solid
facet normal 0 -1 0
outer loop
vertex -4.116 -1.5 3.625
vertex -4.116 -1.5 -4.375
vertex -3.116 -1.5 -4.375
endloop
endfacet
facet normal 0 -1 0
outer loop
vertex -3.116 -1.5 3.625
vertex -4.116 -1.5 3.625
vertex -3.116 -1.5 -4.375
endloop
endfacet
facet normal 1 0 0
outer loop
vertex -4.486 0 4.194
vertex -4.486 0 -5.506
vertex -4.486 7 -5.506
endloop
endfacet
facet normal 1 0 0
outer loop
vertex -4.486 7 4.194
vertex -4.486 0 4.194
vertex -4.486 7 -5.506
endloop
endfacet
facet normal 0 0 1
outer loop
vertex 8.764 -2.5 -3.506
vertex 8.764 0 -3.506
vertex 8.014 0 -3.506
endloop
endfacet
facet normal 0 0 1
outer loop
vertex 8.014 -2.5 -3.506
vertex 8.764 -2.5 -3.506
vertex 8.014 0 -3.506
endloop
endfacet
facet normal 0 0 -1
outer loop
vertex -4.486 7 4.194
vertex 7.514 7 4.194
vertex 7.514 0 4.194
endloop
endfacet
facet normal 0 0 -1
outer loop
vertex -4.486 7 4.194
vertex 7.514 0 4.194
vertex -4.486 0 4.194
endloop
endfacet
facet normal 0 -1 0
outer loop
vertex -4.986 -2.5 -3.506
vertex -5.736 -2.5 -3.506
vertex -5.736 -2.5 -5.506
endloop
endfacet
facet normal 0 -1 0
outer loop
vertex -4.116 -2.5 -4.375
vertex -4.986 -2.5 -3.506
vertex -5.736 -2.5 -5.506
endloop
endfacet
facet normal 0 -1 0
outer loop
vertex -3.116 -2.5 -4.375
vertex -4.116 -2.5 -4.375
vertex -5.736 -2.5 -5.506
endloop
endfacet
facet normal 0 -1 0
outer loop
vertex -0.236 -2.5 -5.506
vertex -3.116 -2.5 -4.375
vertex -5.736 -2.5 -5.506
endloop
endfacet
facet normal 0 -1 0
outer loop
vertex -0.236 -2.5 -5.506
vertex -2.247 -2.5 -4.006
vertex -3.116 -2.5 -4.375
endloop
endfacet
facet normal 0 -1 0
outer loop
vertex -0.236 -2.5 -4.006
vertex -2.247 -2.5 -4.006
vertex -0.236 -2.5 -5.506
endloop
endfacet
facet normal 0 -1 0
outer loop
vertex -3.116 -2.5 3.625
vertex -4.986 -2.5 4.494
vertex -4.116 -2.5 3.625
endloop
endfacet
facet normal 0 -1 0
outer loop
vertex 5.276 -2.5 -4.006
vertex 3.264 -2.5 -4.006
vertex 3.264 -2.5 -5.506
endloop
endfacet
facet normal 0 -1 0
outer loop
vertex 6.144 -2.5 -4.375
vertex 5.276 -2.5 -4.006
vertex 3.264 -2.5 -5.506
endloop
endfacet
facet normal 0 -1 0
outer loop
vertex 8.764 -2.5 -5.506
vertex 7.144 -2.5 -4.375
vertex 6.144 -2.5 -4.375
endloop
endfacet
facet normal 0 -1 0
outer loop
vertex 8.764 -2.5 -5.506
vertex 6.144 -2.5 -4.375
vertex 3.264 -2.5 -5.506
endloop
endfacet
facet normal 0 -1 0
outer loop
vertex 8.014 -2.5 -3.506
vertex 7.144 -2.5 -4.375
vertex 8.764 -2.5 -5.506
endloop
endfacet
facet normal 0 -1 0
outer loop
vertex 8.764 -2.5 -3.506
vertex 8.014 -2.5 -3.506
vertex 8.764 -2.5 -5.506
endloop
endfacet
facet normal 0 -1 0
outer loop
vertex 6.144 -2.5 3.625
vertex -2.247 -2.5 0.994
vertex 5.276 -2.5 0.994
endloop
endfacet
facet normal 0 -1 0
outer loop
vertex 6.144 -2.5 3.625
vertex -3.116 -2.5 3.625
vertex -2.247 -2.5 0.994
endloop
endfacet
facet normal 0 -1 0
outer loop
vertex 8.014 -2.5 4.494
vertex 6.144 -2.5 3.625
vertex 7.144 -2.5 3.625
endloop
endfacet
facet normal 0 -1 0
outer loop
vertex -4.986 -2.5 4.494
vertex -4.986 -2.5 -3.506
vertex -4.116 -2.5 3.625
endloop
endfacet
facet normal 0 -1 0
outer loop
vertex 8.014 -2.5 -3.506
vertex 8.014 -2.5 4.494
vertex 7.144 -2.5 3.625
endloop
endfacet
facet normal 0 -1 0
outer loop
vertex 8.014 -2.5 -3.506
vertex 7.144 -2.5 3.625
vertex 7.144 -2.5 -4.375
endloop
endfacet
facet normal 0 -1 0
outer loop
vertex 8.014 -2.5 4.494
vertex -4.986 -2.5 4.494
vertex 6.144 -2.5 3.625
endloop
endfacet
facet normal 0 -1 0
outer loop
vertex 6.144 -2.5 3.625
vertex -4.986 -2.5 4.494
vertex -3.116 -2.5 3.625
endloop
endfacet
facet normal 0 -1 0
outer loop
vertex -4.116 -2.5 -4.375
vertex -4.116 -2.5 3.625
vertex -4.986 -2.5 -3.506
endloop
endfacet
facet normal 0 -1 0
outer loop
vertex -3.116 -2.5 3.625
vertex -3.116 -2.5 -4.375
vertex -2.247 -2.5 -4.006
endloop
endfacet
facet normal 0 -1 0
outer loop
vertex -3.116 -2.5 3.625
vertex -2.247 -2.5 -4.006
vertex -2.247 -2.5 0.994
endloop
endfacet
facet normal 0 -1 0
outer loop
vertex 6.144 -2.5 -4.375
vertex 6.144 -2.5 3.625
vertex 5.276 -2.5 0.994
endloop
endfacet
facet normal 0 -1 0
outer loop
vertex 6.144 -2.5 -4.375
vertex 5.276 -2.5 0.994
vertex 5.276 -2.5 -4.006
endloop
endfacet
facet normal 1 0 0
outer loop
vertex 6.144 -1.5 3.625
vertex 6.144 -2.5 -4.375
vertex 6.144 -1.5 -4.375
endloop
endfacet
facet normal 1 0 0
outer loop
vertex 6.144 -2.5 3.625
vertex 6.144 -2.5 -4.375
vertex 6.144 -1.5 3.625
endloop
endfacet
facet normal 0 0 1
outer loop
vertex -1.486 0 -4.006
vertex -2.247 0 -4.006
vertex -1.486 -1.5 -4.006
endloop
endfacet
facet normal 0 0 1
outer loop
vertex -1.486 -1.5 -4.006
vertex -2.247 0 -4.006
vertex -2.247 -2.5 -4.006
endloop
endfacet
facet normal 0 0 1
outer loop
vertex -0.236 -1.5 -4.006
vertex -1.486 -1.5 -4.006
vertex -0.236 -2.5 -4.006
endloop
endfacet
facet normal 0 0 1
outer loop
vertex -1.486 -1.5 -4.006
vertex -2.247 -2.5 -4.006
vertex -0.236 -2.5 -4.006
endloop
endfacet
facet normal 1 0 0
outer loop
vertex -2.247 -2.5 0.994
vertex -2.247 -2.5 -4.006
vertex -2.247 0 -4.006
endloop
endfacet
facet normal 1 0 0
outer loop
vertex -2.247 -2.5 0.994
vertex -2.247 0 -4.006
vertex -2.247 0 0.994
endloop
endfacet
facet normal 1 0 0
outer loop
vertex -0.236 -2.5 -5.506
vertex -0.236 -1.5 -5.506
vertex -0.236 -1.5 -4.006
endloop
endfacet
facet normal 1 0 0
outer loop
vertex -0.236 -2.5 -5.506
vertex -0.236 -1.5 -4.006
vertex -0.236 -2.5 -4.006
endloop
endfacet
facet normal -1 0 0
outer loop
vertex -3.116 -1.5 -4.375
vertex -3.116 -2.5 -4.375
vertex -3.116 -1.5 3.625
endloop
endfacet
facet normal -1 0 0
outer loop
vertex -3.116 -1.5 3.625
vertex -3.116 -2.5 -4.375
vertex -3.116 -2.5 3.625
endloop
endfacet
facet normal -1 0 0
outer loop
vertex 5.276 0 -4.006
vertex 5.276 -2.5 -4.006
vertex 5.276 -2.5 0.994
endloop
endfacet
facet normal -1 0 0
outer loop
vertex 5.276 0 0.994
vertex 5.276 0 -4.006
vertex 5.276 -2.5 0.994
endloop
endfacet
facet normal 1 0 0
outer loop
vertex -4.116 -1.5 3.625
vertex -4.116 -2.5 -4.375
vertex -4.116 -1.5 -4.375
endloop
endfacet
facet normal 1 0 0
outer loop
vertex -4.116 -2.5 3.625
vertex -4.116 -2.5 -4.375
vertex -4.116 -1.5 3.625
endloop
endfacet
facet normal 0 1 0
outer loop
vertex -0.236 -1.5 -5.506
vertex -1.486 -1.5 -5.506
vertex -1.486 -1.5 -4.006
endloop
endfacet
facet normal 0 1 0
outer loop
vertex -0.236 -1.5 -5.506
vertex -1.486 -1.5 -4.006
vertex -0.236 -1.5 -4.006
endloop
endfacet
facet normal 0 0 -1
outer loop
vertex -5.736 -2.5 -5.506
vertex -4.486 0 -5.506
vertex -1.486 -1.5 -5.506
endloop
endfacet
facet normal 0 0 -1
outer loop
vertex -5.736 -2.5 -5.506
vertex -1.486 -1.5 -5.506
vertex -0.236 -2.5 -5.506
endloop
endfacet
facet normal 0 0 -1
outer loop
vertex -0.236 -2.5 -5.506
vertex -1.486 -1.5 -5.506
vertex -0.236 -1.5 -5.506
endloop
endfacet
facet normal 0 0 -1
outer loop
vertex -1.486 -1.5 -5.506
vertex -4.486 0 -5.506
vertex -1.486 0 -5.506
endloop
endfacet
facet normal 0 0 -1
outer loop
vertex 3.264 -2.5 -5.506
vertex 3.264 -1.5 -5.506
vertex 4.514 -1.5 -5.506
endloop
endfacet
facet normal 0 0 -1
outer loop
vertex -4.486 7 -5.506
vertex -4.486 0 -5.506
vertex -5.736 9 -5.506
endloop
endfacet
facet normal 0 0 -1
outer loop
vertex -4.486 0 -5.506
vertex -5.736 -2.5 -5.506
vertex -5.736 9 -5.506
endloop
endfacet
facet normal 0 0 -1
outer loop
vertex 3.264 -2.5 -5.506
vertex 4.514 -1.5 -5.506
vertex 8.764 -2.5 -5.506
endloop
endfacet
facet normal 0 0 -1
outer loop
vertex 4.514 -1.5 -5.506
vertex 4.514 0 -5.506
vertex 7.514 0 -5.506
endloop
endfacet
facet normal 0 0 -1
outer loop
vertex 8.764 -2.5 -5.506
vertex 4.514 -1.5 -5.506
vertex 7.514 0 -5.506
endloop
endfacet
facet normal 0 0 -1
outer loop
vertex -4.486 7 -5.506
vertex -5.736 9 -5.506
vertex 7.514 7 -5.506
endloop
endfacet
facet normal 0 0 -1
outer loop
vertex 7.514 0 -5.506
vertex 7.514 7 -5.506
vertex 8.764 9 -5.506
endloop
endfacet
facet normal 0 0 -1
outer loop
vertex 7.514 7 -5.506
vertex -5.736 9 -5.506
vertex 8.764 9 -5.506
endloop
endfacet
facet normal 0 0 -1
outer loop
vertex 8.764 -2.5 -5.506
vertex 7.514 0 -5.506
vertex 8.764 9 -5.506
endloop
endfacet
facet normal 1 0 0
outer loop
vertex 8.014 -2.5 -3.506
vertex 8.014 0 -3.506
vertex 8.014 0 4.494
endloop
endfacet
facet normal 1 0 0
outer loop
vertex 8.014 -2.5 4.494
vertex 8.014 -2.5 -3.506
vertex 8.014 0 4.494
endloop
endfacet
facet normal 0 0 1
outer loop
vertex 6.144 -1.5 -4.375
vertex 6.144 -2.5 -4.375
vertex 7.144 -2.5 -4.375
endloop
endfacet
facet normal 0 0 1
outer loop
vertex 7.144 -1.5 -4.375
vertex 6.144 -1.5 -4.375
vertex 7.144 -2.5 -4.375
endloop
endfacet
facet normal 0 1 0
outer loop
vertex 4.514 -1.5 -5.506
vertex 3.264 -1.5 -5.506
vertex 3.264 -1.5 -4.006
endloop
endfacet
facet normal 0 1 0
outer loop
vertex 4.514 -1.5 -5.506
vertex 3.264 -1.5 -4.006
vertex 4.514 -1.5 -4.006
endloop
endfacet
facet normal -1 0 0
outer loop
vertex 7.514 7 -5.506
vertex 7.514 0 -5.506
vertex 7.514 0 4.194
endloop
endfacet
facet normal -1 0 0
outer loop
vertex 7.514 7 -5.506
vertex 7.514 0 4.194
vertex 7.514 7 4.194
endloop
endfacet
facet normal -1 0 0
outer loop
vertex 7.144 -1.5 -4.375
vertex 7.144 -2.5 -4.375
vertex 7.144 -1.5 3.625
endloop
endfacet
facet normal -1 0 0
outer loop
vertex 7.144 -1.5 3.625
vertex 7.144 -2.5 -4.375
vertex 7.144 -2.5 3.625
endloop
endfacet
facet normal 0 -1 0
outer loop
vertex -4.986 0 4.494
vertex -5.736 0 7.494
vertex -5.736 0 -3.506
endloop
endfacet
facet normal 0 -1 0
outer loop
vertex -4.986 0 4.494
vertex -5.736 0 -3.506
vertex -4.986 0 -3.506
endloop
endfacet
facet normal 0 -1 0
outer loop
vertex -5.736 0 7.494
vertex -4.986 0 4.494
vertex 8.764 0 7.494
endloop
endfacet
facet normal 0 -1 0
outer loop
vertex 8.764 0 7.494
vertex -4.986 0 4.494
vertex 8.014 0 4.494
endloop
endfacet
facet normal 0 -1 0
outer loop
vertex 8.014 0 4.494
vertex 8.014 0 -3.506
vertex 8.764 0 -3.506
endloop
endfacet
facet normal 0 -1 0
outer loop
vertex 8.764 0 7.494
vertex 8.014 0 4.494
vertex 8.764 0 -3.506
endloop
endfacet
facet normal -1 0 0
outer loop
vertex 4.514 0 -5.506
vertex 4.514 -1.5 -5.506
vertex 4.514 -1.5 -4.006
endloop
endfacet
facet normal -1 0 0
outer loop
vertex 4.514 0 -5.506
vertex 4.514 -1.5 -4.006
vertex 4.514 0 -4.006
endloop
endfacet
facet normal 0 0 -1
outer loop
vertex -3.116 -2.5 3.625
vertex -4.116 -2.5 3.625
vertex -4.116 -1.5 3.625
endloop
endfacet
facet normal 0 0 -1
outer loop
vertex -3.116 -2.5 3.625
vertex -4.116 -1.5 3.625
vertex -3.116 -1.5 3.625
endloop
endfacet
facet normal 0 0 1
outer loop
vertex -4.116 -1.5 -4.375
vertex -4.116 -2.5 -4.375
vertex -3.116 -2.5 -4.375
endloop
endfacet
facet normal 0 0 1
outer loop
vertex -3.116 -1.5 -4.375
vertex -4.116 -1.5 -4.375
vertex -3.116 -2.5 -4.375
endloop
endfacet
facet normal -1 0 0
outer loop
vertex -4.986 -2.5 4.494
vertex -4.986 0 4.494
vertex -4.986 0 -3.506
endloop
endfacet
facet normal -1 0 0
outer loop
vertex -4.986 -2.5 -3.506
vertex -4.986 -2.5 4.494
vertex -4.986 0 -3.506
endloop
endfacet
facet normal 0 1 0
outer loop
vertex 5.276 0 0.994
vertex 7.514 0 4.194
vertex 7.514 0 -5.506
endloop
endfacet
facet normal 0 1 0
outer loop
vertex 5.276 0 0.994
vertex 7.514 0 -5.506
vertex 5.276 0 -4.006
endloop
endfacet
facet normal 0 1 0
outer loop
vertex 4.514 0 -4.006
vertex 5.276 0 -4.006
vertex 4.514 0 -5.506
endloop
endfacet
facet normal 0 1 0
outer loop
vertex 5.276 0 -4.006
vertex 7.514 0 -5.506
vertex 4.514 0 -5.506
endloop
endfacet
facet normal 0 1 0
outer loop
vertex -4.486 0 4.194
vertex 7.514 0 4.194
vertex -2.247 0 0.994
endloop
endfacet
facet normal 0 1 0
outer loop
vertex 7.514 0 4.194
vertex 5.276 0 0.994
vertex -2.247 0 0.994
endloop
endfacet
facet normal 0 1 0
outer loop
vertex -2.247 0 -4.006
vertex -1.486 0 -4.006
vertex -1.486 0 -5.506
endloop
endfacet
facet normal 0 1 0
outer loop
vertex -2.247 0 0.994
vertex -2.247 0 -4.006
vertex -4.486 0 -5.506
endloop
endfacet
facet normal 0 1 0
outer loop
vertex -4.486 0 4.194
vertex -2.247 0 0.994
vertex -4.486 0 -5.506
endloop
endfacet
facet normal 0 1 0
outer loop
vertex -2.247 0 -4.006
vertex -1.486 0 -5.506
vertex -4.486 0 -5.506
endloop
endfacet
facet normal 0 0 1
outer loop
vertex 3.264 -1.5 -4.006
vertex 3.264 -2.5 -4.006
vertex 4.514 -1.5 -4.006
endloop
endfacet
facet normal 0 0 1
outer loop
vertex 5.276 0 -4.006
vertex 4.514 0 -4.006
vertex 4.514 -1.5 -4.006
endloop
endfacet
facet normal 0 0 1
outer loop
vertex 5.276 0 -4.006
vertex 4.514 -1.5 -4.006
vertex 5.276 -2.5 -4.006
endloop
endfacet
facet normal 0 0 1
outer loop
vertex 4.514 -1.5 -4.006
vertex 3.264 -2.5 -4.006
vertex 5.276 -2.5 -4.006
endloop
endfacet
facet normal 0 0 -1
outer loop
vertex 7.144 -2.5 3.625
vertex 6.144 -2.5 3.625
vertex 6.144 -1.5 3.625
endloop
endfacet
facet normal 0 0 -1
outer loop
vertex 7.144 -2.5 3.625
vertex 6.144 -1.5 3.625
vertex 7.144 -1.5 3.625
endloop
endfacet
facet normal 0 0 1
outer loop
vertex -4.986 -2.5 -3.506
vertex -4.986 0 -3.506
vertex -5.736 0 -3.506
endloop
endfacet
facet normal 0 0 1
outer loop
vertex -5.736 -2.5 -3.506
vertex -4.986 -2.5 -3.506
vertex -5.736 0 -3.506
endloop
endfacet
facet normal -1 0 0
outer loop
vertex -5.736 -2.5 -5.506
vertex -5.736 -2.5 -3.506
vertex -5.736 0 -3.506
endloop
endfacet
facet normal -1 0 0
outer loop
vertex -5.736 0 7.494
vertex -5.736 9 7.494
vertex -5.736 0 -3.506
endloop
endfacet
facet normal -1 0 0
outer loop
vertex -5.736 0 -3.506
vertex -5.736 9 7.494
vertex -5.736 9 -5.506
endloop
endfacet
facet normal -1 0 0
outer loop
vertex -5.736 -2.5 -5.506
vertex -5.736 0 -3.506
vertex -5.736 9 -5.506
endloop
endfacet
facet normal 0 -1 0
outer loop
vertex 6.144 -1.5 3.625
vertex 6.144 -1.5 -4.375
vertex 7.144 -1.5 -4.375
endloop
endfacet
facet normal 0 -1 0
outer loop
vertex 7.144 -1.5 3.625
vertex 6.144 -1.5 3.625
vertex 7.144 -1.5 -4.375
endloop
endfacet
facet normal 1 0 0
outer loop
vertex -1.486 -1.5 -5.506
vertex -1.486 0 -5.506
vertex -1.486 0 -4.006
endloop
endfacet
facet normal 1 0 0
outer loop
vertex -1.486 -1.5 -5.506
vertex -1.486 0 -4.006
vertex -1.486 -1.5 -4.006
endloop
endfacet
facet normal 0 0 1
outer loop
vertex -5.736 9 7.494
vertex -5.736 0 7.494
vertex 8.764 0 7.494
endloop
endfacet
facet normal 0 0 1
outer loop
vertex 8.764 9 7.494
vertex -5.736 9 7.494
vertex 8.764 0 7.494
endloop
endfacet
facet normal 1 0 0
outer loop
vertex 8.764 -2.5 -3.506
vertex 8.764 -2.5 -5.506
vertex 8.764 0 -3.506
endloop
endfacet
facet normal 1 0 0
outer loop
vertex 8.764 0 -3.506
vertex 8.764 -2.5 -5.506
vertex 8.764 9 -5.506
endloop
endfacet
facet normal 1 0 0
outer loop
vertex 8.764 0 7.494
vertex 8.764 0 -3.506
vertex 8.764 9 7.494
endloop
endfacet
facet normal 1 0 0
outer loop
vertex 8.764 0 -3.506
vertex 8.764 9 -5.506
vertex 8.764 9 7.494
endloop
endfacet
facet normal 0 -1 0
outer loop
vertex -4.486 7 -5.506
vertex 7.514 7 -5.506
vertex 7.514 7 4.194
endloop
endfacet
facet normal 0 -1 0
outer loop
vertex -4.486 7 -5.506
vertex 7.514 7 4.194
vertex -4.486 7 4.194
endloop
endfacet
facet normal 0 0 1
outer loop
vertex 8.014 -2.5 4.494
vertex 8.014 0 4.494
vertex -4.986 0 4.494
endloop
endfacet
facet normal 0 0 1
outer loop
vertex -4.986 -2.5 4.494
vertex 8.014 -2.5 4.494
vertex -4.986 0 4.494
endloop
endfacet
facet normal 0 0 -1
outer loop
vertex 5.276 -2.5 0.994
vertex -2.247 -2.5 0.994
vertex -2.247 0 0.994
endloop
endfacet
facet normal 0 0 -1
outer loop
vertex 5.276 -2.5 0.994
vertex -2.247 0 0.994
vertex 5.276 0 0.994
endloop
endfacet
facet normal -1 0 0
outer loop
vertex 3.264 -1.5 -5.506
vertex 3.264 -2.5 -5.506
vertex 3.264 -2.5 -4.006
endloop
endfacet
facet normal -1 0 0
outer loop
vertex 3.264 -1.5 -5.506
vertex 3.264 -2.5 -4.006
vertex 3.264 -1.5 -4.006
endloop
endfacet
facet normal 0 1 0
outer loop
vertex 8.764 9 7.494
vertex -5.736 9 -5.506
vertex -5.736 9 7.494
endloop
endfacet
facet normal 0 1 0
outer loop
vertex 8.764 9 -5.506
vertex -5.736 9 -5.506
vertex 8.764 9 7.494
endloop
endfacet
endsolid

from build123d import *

# Parameters (mm, degrees)
SKETCH_1_W          = 14.5
SKETCH_1_H          = 13
EXTRUDE_1_DEPTH     = 9
EXTRUDE_2_DEPTH     = 2.5
SKETCH_3_W          = 12
SKETCH_3_H          = 7
CUT_EXTRUDE_1_DEPTH = 9.7
CUT_EXTRUDE_2_DEPTH = 6.5
SKETCH_5_W          = 7.522723779
SKETCH_5_H          = 5
CUT_EXTRUDE_3_DEPTH = 6.5
SKETCH_6_W          = 1
SKETCH_6_H          = 8
CUT_EXTRUDE_4_DEPTH = 1


with BuildPart() as part:
    # 草图1 → 凸台-拉伸1 (new body)
    with BuildSketch(Plane(origin=(0, 0, 0), x_dir=(1, 0, 0), z_dir=(0, 1, 0))):
        with Locations((1.514240506, -0.993670886)):
            Rectangle(SKETCH_1_W, SKETCH_1_H)
    extrude(amount=EXTRUDE_1_DEPTH)

    # 草图2 → 凸台-拉伸2 (add)
    with BuildSketch(Plane.XZ):
        Polygon((-5.735759494, -3.506329114), (-5.735759494, -5.506329114), (8.764240506, -5.506329114), (8.764240506, -3.506329114), (8.014240506, -3.506329114), (8.014240506, 4.493670886), (-4.985759494, 4.493670886), (-4.985759494, -3.506329114), align=None)
    extrude(amount=EXTRUDE_2_DEPTH)

    # 草图3 → 切除-拉伸1 (cut)
    with BuildSketch(Plane(origin=(0, 0, -5.506329114), x_dir=(-1, 0, 0), z_dir=(0, 0, -1))):
        with Locations((-1.514240506, 3.5)):
            Rectangle(SKETCH_3_W, SKETCH_3_H)
    extrude(amount=-CUT_EXTRUDE_1_DEPTH, mode=Mode.SUBTRACT)

    # 草图4 → 切除-拉伸2 (cut)
    with BuildSketch(Plane(origin=(0, 0, -5.506329114), x_dir=(-1, 0, 0), z_dir=(0, 0, -1))):
        Polygon((-4.514240506, 0), (1.485759494, 0), (1.485759494, -1.5), (0.235759494, -1.5), (0.235759494, -2.5), (-3.264240506, -2.5), (-3.264240506, -1.5), (-4.514240506, -1.5), align=None)
    extrude(amount=-CUT_EXTRUDE_2_DEPTH, mode=Mode.SUBTRACT)

    # 草图5 → 切除-拉伸3 (cut)
    with BuildSketch(Plane.XZ.offset(2.5)):
        with Locations((1.514240506, -1.506329114)):
            Rectangle(SKETCH_5_W, SKETCH_5_H)
    extrude(amount=-CUT_EXTRUDE_3_DEPTH, mode=Mode.SUBTRACT)

    # 草图6 → 切除-拉伸4 (cut)
    with BuildSketch(Plane.XZ.offset(2.5)):
        with Locations((-3.615759494, -0.375358935)):
            Rectangle(SKETCH_6_W, SKETCH_6_H)
        with Locations((6.644240506, -0.375358935)):
            Rectangle(SKETCH_6_W, SKETCH_6_H)
    extrude(amount=-CUT_EXTRUDE_4_DEPTH, mode=Mode.SUBTRACT)


solid = part.part
